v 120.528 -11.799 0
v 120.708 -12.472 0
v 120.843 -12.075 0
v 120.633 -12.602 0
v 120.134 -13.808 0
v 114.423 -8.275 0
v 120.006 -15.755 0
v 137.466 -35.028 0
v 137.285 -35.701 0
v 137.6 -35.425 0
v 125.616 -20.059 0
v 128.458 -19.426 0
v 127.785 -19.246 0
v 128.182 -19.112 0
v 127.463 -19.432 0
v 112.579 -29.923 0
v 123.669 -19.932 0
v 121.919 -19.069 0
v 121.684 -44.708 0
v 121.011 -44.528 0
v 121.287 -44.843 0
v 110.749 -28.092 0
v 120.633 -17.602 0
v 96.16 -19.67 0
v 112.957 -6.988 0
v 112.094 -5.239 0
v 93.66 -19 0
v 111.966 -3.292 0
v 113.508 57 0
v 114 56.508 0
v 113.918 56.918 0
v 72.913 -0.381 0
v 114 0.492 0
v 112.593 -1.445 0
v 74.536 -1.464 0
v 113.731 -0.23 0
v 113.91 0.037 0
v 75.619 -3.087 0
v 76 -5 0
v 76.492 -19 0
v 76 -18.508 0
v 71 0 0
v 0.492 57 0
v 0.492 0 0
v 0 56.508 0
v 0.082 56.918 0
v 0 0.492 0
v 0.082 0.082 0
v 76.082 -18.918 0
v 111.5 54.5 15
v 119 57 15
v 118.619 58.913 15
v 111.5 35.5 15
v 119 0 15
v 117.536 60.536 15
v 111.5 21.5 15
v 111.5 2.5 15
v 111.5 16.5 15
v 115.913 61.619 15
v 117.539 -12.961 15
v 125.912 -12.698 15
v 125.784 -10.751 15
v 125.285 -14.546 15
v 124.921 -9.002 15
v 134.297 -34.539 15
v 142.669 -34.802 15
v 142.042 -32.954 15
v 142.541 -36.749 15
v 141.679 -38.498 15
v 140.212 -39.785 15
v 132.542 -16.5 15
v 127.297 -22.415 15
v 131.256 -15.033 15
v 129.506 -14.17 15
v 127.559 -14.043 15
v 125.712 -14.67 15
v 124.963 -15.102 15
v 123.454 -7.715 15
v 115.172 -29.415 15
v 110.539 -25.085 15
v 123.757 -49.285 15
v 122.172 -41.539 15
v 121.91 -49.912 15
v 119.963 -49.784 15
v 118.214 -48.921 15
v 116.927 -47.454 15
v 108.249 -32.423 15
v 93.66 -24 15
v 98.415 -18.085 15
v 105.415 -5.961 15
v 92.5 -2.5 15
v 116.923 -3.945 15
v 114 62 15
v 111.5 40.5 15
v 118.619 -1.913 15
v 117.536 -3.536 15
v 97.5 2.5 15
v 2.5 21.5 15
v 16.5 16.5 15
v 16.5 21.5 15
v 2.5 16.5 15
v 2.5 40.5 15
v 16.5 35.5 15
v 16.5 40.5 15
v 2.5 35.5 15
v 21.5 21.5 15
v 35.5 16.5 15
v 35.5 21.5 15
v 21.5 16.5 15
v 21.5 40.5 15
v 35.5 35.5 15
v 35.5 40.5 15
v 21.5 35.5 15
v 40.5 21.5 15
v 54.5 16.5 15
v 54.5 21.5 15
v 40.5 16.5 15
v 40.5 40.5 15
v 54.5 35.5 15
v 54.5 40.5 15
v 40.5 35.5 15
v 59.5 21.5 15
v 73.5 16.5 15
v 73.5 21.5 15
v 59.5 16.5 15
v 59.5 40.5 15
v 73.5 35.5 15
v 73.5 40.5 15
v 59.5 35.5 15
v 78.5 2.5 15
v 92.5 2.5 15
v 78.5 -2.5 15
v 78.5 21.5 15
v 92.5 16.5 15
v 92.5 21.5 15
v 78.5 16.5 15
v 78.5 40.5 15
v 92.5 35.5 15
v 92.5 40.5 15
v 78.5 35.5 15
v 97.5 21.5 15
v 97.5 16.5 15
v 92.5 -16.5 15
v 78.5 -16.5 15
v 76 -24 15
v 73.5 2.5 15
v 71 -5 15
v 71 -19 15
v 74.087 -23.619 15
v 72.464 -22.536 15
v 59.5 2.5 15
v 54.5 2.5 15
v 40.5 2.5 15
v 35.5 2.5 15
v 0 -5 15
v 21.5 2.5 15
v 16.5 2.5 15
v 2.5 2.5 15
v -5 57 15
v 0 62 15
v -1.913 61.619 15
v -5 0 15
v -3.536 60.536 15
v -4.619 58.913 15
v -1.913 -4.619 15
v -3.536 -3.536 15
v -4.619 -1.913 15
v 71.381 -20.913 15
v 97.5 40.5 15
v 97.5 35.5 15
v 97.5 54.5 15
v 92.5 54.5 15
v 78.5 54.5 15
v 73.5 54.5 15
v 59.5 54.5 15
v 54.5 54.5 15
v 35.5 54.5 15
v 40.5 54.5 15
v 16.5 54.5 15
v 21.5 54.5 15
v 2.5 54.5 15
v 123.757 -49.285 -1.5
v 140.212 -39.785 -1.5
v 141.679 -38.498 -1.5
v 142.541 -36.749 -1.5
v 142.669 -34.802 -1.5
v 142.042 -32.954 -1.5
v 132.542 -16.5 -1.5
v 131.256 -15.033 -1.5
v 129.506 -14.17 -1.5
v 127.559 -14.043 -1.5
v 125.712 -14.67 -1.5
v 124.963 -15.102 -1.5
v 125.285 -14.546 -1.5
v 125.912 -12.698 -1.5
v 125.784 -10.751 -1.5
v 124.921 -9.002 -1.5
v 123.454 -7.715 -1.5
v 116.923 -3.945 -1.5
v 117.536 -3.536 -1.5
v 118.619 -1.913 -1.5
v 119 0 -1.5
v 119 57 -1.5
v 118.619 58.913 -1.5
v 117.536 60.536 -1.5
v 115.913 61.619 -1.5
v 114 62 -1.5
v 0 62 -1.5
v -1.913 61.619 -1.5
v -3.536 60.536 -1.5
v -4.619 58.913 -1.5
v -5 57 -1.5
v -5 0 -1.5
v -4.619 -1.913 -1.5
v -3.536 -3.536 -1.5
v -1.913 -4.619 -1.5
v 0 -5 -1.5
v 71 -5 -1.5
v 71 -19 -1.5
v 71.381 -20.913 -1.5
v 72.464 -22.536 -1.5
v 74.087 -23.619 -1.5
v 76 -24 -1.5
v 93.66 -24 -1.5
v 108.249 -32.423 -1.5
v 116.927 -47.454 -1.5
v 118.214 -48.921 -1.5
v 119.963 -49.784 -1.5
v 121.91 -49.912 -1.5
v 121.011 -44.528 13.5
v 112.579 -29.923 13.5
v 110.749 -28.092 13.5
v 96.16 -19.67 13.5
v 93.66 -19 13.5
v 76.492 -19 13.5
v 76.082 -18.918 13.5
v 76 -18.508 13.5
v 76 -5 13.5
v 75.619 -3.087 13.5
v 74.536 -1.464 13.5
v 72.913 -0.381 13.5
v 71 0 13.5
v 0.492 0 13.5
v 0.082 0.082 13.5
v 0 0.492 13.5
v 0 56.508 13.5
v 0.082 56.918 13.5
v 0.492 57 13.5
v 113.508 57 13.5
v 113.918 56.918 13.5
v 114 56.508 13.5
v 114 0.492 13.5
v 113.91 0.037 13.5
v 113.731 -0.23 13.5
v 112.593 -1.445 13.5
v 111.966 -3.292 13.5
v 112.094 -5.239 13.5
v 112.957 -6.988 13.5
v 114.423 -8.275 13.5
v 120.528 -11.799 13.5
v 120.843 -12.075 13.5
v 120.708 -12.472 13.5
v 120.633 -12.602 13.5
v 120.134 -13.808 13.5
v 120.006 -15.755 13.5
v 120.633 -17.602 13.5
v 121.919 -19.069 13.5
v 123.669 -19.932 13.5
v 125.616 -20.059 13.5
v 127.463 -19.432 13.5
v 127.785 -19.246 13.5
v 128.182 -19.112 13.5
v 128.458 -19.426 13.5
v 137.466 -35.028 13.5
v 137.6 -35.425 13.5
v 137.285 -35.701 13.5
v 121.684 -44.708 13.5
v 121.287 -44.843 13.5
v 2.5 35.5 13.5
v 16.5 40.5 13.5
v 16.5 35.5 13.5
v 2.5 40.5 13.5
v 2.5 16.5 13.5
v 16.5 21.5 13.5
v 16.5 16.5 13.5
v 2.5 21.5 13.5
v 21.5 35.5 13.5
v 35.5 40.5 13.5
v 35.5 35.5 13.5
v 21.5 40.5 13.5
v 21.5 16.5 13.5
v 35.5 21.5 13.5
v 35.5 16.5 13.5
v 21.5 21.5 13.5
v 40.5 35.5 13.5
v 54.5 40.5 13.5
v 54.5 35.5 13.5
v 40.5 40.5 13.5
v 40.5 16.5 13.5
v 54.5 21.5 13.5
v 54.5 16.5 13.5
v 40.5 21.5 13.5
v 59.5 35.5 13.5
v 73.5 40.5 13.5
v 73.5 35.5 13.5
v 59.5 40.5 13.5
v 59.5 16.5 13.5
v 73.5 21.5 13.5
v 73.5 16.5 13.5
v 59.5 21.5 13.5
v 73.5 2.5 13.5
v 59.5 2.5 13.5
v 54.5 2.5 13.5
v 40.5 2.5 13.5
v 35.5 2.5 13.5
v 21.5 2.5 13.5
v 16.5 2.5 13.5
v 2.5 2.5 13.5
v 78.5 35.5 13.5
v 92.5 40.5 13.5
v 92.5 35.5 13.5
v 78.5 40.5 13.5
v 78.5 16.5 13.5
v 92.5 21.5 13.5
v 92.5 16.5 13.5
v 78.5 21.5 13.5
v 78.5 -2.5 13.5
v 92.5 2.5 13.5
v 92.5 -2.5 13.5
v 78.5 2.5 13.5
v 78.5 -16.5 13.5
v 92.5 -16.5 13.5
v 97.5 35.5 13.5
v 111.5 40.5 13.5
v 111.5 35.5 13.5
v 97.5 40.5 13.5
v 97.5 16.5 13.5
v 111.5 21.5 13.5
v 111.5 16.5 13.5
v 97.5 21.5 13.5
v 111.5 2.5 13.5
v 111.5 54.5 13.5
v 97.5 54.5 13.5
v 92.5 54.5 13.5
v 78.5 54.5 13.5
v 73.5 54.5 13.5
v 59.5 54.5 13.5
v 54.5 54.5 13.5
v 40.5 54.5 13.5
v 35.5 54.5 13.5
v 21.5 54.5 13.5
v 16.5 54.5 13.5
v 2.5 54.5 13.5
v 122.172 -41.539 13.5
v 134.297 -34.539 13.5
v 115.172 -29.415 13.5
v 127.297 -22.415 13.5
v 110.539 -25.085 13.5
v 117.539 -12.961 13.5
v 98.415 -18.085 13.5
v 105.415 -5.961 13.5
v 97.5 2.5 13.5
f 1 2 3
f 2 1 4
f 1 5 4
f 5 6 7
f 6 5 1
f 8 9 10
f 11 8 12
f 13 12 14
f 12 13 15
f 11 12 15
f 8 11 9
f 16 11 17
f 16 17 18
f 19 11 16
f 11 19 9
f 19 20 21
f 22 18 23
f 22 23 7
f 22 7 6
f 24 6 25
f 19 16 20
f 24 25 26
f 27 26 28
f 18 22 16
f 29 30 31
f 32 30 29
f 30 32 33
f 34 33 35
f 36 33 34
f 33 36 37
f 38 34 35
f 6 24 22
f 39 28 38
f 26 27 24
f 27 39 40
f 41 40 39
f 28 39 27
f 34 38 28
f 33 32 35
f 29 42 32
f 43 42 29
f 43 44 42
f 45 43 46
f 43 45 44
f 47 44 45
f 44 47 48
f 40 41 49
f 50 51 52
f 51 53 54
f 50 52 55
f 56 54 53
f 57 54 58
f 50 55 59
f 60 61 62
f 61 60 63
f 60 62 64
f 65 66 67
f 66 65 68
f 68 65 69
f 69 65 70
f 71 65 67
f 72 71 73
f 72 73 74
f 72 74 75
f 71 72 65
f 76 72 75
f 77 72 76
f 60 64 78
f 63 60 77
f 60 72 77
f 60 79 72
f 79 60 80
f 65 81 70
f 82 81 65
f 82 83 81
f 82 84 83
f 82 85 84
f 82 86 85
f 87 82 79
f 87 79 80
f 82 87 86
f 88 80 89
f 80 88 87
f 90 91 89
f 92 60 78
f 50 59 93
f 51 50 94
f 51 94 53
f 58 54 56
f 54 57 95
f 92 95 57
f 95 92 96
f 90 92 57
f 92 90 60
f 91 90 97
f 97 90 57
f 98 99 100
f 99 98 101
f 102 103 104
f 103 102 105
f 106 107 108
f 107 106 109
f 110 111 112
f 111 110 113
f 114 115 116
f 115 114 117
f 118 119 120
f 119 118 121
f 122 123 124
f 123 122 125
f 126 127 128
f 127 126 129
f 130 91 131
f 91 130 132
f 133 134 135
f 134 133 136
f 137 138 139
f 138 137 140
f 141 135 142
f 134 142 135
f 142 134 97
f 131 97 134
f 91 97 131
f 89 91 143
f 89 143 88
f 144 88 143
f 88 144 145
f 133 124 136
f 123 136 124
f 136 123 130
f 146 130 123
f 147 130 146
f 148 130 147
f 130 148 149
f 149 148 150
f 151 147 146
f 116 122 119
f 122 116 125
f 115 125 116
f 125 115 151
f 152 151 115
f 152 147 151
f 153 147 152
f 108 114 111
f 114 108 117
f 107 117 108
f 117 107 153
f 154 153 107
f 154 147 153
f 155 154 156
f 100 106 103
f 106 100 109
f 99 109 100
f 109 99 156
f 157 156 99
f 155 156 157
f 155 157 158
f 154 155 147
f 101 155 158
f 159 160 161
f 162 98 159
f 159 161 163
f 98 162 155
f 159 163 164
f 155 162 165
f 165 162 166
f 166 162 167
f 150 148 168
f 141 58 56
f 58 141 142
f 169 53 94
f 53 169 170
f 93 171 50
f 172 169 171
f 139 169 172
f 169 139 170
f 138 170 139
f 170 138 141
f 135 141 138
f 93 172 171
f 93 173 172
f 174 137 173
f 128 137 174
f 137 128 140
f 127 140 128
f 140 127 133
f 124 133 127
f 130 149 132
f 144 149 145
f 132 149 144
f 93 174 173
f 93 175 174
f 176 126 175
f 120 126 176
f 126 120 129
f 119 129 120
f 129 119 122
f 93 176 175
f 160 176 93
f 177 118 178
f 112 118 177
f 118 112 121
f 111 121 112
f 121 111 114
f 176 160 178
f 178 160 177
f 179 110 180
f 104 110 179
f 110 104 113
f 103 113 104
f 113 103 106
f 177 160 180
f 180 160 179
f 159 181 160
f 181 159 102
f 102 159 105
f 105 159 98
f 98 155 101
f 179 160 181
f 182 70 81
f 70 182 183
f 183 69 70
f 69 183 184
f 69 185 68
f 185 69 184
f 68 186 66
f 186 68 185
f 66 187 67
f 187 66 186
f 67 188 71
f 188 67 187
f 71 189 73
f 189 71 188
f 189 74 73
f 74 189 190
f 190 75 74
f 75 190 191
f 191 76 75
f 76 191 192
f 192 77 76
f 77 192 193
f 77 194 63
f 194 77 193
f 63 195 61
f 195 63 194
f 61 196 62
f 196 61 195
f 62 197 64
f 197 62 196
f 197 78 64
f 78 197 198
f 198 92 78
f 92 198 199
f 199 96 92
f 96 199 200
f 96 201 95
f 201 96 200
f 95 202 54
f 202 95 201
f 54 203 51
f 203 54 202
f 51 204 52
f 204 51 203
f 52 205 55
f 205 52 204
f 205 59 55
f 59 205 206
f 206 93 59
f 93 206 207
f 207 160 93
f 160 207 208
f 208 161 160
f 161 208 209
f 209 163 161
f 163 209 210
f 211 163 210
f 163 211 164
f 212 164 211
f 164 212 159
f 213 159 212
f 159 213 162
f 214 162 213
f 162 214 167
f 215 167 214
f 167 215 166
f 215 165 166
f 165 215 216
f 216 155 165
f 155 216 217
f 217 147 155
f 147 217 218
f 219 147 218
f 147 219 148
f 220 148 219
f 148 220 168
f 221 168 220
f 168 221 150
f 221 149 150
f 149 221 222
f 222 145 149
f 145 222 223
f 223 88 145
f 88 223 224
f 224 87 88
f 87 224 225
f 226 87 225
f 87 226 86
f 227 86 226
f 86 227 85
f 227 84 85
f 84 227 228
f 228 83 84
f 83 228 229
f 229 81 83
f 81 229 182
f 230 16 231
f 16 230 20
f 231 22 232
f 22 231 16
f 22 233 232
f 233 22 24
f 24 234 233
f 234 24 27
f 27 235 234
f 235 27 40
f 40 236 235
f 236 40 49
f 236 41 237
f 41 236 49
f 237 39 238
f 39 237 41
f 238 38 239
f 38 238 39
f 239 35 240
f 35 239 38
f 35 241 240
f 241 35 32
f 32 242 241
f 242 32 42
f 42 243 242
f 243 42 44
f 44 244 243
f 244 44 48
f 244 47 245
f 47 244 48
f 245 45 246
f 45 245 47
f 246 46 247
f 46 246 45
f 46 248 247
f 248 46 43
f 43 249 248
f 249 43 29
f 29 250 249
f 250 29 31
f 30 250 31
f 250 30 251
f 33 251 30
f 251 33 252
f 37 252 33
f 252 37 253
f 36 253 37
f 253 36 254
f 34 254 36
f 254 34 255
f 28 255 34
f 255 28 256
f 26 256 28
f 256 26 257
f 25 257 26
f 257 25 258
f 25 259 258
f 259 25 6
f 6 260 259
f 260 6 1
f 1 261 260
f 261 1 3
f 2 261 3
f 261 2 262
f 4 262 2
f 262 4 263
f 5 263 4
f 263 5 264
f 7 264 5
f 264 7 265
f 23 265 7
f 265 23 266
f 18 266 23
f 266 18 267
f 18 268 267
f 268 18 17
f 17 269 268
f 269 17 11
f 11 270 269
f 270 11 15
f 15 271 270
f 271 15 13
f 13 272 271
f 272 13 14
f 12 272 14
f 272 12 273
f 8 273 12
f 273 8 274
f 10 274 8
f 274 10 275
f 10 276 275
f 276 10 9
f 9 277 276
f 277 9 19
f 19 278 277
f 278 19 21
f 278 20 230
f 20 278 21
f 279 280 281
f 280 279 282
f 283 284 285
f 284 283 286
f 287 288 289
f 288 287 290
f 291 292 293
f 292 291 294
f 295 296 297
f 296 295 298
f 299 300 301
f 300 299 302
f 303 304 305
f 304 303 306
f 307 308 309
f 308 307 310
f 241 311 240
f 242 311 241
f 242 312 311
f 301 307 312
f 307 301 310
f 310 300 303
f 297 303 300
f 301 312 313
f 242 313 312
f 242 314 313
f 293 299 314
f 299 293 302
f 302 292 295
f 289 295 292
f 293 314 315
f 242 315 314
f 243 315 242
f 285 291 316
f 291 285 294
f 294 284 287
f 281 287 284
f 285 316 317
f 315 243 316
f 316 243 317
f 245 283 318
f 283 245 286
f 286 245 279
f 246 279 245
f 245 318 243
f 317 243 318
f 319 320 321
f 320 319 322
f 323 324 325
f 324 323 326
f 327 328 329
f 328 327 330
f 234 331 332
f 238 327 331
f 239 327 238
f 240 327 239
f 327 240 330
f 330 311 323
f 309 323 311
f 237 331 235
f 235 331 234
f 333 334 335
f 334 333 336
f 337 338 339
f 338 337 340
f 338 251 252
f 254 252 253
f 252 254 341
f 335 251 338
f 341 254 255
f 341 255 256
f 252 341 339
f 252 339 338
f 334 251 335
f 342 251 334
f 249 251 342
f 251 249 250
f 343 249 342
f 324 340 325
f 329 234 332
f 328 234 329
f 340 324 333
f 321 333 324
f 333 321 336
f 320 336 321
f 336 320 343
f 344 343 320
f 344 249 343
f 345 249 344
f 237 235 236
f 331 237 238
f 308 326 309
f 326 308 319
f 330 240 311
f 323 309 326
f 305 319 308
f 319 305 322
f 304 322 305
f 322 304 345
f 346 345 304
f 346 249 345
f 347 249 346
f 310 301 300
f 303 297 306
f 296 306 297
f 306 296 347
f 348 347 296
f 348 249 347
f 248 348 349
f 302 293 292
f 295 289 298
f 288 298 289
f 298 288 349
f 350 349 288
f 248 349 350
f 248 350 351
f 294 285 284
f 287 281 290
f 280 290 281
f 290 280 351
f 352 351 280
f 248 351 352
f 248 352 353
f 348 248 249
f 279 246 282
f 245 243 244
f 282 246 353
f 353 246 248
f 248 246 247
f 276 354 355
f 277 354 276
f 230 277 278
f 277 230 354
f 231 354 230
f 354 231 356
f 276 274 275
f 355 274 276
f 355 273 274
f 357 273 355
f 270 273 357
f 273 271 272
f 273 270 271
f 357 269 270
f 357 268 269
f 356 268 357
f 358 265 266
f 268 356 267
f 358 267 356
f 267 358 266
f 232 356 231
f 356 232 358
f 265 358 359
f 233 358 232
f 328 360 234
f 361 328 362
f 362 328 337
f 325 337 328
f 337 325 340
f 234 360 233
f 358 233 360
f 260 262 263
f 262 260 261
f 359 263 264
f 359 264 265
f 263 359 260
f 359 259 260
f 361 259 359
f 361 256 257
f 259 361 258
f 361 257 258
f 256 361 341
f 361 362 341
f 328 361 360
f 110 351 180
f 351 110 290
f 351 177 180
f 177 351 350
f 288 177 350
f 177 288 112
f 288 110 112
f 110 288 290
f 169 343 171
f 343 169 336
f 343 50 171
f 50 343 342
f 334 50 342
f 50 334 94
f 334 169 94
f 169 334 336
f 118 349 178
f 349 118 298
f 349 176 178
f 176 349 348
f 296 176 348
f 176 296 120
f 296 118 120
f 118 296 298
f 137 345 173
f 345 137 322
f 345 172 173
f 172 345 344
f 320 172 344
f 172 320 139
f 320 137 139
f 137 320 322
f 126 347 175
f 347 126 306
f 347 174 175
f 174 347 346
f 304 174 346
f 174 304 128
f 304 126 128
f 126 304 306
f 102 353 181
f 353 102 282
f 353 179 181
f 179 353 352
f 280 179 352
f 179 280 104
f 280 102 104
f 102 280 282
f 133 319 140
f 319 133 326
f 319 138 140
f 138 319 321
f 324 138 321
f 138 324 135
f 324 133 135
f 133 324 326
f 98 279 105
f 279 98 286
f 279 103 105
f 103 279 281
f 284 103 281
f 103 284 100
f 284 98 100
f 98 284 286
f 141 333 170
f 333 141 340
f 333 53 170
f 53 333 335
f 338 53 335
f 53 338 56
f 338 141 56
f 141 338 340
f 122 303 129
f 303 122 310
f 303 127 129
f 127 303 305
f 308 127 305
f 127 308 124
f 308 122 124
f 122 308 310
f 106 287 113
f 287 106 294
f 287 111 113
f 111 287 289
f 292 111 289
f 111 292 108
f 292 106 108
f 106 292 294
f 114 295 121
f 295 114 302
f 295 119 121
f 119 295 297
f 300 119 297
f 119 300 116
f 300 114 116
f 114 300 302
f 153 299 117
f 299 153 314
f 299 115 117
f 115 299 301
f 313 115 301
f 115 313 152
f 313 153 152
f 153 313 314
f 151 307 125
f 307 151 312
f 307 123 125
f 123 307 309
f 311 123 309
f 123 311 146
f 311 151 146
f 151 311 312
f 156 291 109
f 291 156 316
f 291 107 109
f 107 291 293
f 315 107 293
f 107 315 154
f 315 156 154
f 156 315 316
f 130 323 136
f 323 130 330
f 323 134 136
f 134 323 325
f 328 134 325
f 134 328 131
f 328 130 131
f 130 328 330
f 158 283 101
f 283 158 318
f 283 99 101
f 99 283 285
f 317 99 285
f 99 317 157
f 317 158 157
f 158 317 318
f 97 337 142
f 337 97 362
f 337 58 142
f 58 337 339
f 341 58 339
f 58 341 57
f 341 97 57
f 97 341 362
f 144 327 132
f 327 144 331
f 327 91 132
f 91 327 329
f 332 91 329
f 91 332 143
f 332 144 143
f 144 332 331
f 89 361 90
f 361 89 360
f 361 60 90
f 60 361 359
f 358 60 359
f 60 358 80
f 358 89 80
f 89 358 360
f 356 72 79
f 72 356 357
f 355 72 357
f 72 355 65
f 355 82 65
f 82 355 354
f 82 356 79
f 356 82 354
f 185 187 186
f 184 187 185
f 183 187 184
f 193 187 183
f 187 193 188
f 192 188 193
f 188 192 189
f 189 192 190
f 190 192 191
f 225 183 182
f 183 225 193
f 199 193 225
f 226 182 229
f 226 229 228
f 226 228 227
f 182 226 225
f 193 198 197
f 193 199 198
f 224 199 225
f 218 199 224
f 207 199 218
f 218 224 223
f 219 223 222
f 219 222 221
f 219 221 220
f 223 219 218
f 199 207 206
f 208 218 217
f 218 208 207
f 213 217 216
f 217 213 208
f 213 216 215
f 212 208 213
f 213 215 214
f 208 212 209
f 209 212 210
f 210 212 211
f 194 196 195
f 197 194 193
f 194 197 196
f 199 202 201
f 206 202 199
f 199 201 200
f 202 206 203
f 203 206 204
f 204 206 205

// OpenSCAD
// TODO
// internal columns to prevent some plate flex
// cutouts for cables
// pro micro holder
// tenting method

// Switch module constants
switch_dimension = [14, 14];
spacing = 5;
module_dimension = [switch_dimension[0]+spacing, switch_dimension[1]+spacing];
plate_thickness = 1.5;

// Layout constants
columns = 6;
rows = 3;

// Thumb cluster constants
thumb_columns = 3;
thumb_rows = 1;
thumb_columns_offset = 2;
thumb_rot_step = 30;

// Case constants
case_height = 15;

module spacing(){
	square([
		module_dimension[0],
		module_dimension[1]], center=false);
}

module cutout(create_switch_hole=false){
	translate([spacing/2, spacing/2, 0]) square([
				switch_dimension[0],
				switch_dimension[1]], center=false);
}

module shell(get_cutouts=false){
	// Main switch area
	for (x = [0:1:columns-1]){
		for (y = [0:1:rows-1]){
			translate([x*module_dimension[0], y*module_dimension[1], 0]){
				if (get_cutouts == true){
					cutout();
				}else{
					spacing();
				}
			}
		}
	}

	// Thumb cluster
	for (t = [0:1:thumb_columns-1]){
		dy = offset_y(t, thumb_rot_step);
		translate([
			// right side
			module_dimension[0]*(columns+thumb_columns-thumb_columns_offset+1) 
				- module_dimension[0]*((thumb_columns-t)) // offset per switch
				- offset_x(module_dimension[0], dy), // adjust based on rotation
			-module_dimension[1] - dy,
		0]){
			rotate([0,0,-thumb_rot_step*(t)]){
				if (get_cutouts == true){
					cutout();
				}else{
					spacing();
				}
			}
		}
	}
}

module cutouts(create_switch_hole=true){
	shell(true);
}

function offset_y(step, rot) = step>1 ? (sin(rot*(step-1))*module_dimension[0]) : 0;
function offset_x(hyp, y) = sqrt(hyp*hyp + y*y);

	
color("#999"){
	// Case
	linear_extrude(case_height){
		difference(){
			offset(spacing) shell();
			offset(-spacing) offset(spacing) shell();
		}
	}

	// Plate
	translate([0,0,case_height-plate_thickness]){
		linear_extrude(plate_thickness){
			difference(){
				offset(spacing) shell();
				cutouts();
			}
		}
	}

}
// Base
color("#ddd"){
	translate([0,0,-plate_thickness]){
		linear_extrude(plate_thickness){
			difference(){
				offset(spacing) shell();
				// cutouts();
			}
		}
	}
}
